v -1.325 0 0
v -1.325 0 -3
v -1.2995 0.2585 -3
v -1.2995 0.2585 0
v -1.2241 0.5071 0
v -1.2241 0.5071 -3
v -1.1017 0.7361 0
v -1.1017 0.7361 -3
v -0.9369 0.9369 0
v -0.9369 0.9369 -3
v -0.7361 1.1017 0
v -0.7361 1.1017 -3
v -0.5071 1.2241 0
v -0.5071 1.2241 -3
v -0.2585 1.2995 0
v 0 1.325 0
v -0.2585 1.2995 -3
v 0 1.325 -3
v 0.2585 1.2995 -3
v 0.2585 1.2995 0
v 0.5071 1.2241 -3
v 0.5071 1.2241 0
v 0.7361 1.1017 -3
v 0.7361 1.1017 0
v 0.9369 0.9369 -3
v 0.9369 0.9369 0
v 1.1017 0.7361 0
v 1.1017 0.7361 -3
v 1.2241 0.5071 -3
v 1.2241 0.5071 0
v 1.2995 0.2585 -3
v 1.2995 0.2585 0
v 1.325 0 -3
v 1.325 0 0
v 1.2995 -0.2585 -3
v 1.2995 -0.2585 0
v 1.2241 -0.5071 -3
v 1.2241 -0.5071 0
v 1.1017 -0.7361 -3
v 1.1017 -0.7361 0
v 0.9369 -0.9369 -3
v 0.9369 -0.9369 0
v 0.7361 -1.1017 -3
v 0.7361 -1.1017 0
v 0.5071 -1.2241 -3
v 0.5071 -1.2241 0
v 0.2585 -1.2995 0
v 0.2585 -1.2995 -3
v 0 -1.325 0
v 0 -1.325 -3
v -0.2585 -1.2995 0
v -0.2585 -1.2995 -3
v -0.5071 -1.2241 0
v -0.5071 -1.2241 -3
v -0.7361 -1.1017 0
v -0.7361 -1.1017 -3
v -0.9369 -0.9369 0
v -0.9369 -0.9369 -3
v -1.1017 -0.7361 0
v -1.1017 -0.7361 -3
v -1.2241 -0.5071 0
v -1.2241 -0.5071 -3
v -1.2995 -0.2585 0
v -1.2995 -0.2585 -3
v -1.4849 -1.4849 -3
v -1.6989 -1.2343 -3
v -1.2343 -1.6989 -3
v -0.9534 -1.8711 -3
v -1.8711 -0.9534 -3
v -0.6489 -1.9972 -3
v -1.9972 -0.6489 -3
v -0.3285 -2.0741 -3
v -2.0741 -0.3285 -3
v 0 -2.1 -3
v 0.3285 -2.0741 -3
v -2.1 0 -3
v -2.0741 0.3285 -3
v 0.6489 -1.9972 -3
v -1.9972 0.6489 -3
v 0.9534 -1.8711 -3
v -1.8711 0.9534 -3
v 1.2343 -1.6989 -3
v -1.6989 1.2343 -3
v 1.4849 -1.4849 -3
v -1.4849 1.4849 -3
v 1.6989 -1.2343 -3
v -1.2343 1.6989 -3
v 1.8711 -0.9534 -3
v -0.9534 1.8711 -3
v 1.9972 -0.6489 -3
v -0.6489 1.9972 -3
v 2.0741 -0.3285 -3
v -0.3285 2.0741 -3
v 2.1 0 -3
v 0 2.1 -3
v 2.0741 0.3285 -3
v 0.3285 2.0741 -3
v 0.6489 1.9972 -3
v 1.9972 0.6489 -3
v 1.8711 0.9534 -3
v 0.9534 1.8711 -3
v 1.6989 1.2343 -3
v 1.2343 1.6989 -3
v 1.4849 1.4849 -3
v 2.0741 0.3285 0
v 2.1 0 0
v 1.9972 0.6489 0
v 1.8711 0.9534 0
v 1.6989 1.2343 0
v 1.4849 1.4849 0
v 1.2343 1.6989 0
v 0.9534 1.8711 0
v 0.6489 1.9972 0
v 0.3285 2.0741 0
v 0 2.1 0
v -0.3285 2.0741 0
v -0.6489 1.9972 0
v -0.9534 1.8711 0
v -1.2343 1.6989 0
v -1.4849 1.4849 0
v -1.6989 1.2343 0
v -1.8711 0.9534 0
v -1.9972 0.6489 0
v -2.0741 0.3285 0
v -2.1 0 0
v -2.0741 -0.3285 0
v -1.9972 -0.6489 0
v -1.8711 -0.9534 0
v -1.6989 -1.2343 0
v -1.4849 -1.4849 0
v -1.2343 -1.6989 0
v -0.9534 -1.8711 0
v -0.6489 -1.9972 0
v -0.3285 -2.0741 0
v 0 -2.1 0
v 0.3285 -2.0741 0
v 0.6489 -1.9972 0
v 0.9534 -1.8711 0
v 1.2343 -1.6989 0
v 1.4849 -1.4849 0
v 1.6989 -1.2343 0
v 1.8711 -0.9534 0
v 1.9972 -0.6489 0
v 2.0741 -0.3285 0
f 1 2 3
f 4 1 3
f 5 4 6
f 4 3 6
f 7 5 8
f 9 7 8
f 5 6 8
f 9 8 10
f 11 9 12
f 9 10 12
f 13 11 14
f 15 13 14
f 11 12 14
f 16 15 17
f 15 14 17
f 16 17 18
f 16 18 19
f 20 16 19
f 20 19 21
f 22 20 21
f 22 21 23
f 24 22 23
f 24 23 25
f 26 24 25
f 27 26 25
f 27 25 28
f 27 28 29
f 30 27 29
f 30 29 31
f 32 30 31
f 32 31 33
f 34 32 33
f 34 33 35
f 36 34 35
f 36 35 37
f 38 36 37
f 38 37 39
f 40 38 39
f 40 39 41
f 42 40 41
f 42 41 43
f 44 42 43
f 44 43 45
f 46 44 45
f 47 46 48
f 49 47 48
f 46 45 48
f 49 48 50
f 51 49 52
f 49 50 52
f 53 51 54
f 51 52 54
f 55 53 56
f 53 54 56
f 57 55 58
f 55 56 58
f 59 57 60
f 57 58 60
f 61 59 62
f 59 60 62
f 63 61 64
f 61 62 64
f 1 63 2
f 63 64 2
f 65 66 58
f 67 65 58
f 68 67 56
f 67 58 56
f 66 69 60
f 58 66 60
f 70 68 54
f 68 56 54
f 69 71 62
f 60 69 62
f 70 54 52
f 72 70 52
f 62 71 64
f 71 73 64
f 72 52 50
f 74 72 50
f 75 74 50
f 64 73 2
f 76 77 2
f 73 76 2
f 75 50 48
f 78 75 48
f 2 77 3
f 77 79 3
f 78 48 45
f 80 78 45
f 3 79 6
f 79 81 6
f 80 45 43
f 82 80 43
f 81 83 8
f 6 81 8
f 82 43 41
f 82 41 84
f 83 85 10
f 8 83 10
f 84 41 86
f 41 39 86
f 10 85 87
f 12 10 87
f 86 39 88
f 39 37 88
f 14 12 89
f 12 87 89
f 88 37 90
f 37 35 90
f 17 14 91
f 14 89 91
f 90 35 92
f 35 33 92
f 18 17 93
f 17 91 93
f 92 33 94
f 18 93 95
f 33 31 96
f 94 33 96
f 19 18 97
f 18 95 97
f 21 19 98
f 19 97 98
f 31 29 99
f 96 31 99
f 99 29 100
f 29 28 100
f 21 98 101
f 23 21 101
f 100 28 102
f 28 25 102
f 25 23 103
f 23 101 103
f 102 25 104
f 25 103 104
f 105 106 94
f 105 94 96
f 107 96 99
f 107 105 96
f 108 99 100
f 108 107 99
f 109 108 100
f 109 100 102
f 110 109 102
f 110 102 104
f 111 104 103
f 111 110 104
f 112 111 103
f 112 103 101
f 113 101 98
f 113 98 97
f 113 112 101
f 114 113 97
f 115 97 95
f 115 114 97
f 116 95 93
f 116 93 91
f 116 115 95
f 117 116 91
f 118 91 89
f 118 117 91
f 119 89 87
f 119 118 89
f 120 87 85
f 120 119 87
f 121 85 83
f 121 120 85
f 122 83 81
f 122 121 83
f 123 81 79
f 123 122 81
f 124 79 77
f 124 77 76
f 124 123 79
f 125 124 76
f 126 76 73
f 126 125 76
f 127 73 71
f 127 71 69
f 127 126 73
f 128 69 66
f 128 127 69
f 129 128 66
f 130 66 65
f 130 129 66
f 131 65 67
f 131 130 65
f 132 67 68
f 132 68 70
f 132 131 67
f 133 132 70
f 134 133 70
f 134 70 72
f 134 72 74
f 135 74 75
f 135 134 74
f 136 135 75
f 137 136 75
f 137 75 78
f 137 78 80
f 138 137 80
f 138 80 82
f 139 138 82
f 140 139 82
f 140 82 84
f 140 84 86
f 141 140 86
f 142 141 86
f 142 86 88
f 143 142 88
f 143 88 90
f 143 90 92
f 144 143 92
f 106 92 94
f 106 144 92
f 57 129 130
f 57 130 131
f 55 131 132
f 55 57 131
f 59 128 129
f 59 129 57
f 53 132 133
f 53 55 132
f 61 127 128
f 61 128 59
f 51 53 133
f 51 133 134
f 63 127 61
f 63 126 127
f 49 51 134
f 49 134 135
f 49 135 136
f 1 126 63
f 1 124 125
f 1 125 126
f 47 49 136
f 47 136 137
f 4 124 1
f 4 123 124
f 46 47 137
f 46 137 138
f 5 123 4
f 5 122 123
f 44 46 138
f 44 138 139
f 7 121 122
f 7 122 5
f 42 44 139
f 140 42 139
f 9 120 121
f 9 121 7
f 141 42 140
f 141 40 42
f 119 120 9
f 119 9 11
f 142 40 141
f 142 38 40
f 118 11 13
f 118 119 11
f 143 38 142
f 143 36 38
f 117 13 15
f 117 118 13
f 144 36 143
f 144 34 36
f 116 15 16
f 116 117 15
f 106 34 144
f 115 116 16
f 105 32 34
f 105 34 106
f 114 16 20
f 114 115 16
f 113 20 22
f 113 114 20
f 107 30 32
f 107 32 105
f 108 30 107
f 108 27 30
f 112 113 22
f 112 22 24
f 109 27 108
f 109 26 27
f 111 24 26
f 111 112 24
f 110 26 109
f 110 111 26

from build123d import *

# Parameters (mm, degrees)
SKETCH_7_W      = 3
SKETCH_7_H      = 1.9
M3X0_351_D      = 2.65
SKETCH_48_R     = 2.1
SKETCH_48_R_2   = 1.9
EXTRUDE_1_DEPTH = 3


with BuildPart() as part:
    # Эскиз7 → Повернуть1 (revolve)
    with BuildSketch(Plane(origin=(0, 0, 0), x_dir=(0, 0, -1), z_dir=(1, 0, 0))):
        with Locations((1.5, 0.95)):
            Rectangle(SKETCH_7_W, SKETCH_7_H)
    revolve(axis=Axis((0, 0, 0), (0, 0, -1)))

    # Отверстие обработанное метчиком M3x0.351 (through all)
    with Locations(Plane.XY):
        with Locations((0, 0)):
            Hole(M3X0_351_D / 2)

    # Эскиз48 → Бобышка-Вытянуть1 (add)
    with BuildSketch(Plane.XY):
        Circle(SKETCH_48_R)
        Circle(SKETCH_48_R_2, mode=Mode.SUBTRACT)
    extrude(amount=-EXTRUDE_1_DEPTH)


solid = part.part
